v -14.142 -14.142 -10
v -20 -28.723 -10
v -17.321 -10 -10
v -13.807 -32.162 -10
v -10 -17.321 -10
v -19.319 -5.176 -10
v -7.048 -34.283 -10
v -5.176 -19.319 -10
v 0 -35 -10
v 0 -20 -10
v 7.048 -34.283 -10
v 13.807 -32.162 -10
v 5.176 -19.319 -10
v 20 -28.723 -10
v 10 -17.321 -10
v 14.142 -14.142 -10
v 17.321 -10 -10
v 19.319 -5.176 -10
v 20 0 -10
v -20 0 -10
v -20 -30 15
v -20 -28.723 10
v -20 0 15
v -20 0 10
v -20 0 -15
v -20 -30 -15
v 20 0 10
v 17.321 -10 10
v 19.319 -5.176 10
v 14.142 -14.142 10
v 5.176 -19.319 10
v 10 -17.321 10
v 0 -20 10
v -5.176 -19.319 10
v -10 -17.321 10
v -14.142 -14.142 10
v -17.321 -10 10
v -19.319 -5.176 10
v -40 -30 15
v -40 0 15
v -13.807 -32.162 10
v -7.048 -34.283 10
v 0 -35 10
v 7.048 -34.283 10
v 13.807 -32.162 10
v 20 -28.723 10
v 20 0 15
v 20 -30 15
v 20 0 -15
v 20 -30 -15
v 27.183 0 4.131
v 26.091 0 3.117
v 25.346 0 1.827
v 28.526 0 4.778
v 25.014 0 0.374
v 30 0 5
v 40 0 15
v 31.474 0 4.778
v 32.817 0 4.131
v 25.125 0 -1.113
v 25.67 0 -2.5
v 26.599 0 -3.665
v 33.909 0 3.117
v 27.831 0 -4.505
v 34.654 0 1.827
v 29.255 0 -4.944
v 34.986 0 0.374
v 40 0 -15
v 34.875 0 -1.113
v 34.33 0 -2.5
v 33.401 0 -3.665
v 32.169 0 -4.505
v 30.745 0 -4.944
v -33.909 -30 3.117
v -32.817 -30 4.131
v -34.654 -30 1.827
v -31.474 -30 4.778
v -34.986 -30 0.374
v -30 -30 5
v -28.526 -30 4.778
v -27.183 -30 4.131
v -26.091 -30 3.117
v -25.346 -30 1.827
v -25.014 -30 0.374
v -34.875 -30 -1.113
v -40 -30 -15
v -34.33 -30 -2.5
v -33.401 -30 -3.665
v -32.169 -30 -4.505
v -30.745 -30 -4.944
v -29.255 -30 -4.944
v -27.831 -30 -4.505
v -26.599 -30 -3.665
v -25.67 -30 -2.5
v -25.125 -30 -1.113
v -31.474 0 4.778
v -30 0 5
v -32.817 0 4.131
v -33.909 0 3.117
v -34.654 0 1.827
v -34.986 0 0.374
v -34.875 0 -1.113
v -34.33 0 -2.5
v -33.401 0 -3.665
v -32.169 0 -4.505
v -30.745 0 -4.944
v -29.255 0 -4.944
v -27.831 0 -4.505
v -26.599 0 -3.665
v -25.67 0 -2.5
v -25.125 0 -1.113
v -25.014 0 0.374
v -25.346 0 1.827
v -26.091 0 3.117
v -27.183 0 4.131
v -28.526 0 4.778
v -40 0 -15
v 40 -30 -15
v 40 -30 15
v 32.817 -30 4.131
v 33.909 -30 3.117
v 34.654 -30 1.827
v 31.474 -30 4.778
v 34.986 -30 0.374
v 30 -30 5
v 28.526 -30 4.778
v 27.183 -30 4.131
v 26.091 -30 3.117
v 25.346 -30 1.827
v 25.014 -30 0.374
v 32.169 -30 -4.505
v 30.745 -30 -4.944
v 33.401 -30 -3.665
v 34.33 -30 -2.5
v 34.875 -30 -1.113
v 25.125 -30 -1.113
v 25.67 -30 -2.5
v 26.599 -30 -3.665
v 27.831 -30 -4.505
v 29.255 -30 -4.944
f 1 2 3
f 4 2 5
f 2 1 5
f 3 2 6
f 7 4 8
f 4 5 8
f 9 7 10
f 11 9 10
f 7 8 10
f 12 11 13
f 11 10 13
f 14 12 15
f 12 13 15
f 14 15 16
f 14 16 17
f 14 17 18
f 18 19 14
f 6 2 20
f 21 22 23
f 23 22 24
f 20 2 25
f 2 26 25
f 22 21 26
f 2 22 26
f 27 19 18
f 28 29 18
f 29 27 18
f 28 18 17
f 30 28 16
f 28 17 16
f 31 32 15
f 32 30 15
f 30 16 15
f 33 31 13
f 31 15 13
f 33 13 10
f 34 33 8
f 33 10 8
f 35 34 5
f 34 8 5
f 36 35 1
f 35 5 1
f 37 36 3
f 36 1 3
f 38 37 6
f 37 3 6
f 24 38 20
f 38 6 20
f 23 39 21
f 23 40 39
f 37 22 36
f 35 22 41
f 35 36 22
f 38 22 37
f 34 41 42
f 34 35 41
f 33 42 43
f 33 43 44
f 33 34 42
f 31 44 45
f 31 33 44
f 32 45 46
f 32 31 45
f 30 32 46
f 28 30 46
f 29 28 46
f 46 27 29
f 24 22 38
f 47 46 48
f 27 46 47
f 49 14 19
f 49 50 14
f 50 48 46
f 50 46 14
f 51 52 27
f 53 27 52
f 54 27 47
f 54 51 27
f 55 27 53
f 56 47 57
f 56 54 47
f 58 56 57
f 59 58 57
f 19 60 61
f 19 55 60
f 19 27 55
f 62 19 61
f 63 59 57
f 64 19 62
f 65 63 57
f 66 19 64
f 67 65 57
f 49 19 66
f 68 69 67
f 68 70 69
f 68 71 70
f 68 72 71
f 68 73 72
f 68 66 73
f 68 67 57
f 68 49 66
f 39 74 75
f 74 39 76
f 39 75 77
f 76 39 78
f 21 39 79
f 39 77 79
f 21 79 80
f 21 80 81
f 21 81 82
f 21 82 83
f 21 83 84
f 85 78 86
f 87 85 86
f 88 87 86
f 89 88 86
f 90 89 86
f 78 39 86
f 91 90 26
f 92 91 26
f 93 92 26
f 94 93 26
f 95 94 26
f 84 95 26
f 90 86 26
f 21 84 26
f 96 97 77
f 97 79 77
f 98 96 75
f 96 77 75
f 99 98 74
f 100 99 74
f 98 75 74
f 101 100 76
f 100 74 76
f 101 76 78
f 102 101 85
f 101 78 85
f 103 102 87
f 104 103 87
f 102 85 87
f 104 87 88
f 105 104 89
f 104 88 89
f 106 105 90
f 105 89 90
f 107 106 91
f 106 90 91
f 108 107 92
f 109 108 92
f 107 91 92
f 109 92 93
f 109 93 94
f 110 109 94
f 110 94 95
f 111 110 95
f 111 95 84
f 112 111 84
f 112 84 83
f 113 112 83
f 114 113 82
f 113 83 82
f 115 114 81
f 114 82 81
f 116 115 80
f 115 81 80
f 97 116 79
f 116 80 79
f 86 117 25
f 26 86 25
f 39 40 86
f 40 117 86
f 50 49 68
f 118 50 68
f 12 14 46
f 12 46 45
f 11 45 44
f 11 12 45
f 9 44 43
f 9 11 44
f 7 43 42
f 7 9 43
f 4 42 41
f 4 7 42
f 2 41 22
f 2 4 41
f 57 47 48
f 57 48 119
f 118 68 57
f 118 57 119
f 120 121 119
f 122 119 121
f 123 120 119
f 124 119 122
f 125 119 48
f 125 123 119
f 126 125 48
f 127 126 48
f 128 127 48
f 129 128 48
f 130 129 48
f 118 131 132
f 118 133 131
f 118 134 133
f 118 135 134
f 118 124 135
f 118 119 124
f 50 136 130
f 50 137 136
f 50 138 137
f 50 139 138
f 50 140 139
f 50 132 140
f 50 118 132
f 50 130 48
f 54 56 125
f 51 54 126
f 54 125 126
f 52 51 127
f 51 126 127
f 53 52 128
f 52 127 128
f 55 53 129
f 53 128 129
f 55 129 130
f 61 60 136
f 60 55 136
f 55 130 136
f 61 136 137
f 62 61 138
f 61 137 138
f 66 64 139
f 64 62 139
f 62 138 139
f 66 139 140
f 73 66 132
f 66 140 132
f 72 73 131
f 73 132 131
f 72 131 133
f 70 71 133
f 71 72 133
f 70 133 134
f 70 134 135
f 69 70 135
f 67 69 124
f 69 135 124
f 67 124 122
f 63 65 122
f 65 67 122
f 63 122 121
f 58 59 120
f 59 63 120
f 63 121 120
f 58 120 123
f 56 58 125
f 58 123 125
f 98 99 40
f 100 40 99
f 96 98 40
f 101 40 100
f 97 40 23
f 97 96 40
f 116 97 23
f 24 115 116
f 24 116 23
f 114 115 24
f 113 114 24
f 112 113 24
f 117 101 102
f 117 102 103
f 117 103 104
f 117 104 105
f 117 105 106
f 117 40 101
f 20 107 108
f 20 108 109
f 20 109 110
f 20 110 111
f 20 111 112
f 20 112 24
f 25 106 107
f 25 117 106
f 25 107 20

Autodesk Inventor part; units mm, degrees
ref_plane "YZ Plane" through (0, 0, 0) normal (1, 0, 0) x (0, 1, 0)
ref_plane "XZ Plane" through (0, 0, 0) normal (0, 1, 0) x (-1, 0, 0)
ref_plane "XY Plane" through (0, 0, 0) normal (0, 0, 1) x (1, 0, 0)
sketch "草图1" plane through (0, 0, 0) normal (0, 0, 1) x (1, 0, 0)
  circle A0 centre (0, 0) radius 20 projected
  circle A1 centre (0, 0) radius 35
  line L0 (-35, 0) -> (35, 0)
  point P0 (-20, 0)
  point P1 (20, 0)
  dimension "d0" = 70
  dimension "d1" = 70
extrude "拉伸1" add sketch "草图1" along normal mid plane 20 contours L0 A1 A0 picked at (-29.7075, -2.5961)
sketch "草图2" plane through (0, 0, 0) normal (0, 0, 1) x (1, 0, 0)
  line L0 (-20, 0) -> (-40, 0)
  line L1 (-40, 0) -> (-40, -30)
  line L2 (-40, -30) -> (-20, -30)
  line L3 (-20, -30) -> (-20, 0)
  line L4 (20, 0) -> (35, 0) projected
  line L5 (20, 0) -> (40, 0)
  line L6 (40, 0) -> (40, -30)
  line L7 (40, -30) -> (20, -30)
  line L8 (20, -30) -> (20, 0)
  point P0 (0, 0)
  dimension "d4" = 20
  dimension "d5" = 30
  dimension "d6" = 20
  dimension "d7" = 30
extrude "拉伸2" add sketch "草图2" along normal mid plane 30
sketch "草图3" plane through (-40, 0, -15) normal (0, 1, 0) x (1, 0, 0)
  line L0 (20, -5) -> (20, -25) construction
  line L1 (20, 0) -> (20, -5) construction
  line L2 (0, 0) -> (20, 0) construction
  line L3 (0, -30) -> (0, 0) construction
  line L4 (20, -30) -> (0, -30) construction
  line L5 (20, -25) -> (20, -30) construction
  point P0 (40, -15)
  point P1 (10, -15)
  point P2 (20, -15)
  point P3 (10, 0)
hole "孔1" at (-30, 0, 0) direction (0, -1, 0) diameter 10 end through all
mirror "镜像1" about plane through (0, 0, 0) normal (1, 0, 0) of "孔1"
properties part number "连接下环"
